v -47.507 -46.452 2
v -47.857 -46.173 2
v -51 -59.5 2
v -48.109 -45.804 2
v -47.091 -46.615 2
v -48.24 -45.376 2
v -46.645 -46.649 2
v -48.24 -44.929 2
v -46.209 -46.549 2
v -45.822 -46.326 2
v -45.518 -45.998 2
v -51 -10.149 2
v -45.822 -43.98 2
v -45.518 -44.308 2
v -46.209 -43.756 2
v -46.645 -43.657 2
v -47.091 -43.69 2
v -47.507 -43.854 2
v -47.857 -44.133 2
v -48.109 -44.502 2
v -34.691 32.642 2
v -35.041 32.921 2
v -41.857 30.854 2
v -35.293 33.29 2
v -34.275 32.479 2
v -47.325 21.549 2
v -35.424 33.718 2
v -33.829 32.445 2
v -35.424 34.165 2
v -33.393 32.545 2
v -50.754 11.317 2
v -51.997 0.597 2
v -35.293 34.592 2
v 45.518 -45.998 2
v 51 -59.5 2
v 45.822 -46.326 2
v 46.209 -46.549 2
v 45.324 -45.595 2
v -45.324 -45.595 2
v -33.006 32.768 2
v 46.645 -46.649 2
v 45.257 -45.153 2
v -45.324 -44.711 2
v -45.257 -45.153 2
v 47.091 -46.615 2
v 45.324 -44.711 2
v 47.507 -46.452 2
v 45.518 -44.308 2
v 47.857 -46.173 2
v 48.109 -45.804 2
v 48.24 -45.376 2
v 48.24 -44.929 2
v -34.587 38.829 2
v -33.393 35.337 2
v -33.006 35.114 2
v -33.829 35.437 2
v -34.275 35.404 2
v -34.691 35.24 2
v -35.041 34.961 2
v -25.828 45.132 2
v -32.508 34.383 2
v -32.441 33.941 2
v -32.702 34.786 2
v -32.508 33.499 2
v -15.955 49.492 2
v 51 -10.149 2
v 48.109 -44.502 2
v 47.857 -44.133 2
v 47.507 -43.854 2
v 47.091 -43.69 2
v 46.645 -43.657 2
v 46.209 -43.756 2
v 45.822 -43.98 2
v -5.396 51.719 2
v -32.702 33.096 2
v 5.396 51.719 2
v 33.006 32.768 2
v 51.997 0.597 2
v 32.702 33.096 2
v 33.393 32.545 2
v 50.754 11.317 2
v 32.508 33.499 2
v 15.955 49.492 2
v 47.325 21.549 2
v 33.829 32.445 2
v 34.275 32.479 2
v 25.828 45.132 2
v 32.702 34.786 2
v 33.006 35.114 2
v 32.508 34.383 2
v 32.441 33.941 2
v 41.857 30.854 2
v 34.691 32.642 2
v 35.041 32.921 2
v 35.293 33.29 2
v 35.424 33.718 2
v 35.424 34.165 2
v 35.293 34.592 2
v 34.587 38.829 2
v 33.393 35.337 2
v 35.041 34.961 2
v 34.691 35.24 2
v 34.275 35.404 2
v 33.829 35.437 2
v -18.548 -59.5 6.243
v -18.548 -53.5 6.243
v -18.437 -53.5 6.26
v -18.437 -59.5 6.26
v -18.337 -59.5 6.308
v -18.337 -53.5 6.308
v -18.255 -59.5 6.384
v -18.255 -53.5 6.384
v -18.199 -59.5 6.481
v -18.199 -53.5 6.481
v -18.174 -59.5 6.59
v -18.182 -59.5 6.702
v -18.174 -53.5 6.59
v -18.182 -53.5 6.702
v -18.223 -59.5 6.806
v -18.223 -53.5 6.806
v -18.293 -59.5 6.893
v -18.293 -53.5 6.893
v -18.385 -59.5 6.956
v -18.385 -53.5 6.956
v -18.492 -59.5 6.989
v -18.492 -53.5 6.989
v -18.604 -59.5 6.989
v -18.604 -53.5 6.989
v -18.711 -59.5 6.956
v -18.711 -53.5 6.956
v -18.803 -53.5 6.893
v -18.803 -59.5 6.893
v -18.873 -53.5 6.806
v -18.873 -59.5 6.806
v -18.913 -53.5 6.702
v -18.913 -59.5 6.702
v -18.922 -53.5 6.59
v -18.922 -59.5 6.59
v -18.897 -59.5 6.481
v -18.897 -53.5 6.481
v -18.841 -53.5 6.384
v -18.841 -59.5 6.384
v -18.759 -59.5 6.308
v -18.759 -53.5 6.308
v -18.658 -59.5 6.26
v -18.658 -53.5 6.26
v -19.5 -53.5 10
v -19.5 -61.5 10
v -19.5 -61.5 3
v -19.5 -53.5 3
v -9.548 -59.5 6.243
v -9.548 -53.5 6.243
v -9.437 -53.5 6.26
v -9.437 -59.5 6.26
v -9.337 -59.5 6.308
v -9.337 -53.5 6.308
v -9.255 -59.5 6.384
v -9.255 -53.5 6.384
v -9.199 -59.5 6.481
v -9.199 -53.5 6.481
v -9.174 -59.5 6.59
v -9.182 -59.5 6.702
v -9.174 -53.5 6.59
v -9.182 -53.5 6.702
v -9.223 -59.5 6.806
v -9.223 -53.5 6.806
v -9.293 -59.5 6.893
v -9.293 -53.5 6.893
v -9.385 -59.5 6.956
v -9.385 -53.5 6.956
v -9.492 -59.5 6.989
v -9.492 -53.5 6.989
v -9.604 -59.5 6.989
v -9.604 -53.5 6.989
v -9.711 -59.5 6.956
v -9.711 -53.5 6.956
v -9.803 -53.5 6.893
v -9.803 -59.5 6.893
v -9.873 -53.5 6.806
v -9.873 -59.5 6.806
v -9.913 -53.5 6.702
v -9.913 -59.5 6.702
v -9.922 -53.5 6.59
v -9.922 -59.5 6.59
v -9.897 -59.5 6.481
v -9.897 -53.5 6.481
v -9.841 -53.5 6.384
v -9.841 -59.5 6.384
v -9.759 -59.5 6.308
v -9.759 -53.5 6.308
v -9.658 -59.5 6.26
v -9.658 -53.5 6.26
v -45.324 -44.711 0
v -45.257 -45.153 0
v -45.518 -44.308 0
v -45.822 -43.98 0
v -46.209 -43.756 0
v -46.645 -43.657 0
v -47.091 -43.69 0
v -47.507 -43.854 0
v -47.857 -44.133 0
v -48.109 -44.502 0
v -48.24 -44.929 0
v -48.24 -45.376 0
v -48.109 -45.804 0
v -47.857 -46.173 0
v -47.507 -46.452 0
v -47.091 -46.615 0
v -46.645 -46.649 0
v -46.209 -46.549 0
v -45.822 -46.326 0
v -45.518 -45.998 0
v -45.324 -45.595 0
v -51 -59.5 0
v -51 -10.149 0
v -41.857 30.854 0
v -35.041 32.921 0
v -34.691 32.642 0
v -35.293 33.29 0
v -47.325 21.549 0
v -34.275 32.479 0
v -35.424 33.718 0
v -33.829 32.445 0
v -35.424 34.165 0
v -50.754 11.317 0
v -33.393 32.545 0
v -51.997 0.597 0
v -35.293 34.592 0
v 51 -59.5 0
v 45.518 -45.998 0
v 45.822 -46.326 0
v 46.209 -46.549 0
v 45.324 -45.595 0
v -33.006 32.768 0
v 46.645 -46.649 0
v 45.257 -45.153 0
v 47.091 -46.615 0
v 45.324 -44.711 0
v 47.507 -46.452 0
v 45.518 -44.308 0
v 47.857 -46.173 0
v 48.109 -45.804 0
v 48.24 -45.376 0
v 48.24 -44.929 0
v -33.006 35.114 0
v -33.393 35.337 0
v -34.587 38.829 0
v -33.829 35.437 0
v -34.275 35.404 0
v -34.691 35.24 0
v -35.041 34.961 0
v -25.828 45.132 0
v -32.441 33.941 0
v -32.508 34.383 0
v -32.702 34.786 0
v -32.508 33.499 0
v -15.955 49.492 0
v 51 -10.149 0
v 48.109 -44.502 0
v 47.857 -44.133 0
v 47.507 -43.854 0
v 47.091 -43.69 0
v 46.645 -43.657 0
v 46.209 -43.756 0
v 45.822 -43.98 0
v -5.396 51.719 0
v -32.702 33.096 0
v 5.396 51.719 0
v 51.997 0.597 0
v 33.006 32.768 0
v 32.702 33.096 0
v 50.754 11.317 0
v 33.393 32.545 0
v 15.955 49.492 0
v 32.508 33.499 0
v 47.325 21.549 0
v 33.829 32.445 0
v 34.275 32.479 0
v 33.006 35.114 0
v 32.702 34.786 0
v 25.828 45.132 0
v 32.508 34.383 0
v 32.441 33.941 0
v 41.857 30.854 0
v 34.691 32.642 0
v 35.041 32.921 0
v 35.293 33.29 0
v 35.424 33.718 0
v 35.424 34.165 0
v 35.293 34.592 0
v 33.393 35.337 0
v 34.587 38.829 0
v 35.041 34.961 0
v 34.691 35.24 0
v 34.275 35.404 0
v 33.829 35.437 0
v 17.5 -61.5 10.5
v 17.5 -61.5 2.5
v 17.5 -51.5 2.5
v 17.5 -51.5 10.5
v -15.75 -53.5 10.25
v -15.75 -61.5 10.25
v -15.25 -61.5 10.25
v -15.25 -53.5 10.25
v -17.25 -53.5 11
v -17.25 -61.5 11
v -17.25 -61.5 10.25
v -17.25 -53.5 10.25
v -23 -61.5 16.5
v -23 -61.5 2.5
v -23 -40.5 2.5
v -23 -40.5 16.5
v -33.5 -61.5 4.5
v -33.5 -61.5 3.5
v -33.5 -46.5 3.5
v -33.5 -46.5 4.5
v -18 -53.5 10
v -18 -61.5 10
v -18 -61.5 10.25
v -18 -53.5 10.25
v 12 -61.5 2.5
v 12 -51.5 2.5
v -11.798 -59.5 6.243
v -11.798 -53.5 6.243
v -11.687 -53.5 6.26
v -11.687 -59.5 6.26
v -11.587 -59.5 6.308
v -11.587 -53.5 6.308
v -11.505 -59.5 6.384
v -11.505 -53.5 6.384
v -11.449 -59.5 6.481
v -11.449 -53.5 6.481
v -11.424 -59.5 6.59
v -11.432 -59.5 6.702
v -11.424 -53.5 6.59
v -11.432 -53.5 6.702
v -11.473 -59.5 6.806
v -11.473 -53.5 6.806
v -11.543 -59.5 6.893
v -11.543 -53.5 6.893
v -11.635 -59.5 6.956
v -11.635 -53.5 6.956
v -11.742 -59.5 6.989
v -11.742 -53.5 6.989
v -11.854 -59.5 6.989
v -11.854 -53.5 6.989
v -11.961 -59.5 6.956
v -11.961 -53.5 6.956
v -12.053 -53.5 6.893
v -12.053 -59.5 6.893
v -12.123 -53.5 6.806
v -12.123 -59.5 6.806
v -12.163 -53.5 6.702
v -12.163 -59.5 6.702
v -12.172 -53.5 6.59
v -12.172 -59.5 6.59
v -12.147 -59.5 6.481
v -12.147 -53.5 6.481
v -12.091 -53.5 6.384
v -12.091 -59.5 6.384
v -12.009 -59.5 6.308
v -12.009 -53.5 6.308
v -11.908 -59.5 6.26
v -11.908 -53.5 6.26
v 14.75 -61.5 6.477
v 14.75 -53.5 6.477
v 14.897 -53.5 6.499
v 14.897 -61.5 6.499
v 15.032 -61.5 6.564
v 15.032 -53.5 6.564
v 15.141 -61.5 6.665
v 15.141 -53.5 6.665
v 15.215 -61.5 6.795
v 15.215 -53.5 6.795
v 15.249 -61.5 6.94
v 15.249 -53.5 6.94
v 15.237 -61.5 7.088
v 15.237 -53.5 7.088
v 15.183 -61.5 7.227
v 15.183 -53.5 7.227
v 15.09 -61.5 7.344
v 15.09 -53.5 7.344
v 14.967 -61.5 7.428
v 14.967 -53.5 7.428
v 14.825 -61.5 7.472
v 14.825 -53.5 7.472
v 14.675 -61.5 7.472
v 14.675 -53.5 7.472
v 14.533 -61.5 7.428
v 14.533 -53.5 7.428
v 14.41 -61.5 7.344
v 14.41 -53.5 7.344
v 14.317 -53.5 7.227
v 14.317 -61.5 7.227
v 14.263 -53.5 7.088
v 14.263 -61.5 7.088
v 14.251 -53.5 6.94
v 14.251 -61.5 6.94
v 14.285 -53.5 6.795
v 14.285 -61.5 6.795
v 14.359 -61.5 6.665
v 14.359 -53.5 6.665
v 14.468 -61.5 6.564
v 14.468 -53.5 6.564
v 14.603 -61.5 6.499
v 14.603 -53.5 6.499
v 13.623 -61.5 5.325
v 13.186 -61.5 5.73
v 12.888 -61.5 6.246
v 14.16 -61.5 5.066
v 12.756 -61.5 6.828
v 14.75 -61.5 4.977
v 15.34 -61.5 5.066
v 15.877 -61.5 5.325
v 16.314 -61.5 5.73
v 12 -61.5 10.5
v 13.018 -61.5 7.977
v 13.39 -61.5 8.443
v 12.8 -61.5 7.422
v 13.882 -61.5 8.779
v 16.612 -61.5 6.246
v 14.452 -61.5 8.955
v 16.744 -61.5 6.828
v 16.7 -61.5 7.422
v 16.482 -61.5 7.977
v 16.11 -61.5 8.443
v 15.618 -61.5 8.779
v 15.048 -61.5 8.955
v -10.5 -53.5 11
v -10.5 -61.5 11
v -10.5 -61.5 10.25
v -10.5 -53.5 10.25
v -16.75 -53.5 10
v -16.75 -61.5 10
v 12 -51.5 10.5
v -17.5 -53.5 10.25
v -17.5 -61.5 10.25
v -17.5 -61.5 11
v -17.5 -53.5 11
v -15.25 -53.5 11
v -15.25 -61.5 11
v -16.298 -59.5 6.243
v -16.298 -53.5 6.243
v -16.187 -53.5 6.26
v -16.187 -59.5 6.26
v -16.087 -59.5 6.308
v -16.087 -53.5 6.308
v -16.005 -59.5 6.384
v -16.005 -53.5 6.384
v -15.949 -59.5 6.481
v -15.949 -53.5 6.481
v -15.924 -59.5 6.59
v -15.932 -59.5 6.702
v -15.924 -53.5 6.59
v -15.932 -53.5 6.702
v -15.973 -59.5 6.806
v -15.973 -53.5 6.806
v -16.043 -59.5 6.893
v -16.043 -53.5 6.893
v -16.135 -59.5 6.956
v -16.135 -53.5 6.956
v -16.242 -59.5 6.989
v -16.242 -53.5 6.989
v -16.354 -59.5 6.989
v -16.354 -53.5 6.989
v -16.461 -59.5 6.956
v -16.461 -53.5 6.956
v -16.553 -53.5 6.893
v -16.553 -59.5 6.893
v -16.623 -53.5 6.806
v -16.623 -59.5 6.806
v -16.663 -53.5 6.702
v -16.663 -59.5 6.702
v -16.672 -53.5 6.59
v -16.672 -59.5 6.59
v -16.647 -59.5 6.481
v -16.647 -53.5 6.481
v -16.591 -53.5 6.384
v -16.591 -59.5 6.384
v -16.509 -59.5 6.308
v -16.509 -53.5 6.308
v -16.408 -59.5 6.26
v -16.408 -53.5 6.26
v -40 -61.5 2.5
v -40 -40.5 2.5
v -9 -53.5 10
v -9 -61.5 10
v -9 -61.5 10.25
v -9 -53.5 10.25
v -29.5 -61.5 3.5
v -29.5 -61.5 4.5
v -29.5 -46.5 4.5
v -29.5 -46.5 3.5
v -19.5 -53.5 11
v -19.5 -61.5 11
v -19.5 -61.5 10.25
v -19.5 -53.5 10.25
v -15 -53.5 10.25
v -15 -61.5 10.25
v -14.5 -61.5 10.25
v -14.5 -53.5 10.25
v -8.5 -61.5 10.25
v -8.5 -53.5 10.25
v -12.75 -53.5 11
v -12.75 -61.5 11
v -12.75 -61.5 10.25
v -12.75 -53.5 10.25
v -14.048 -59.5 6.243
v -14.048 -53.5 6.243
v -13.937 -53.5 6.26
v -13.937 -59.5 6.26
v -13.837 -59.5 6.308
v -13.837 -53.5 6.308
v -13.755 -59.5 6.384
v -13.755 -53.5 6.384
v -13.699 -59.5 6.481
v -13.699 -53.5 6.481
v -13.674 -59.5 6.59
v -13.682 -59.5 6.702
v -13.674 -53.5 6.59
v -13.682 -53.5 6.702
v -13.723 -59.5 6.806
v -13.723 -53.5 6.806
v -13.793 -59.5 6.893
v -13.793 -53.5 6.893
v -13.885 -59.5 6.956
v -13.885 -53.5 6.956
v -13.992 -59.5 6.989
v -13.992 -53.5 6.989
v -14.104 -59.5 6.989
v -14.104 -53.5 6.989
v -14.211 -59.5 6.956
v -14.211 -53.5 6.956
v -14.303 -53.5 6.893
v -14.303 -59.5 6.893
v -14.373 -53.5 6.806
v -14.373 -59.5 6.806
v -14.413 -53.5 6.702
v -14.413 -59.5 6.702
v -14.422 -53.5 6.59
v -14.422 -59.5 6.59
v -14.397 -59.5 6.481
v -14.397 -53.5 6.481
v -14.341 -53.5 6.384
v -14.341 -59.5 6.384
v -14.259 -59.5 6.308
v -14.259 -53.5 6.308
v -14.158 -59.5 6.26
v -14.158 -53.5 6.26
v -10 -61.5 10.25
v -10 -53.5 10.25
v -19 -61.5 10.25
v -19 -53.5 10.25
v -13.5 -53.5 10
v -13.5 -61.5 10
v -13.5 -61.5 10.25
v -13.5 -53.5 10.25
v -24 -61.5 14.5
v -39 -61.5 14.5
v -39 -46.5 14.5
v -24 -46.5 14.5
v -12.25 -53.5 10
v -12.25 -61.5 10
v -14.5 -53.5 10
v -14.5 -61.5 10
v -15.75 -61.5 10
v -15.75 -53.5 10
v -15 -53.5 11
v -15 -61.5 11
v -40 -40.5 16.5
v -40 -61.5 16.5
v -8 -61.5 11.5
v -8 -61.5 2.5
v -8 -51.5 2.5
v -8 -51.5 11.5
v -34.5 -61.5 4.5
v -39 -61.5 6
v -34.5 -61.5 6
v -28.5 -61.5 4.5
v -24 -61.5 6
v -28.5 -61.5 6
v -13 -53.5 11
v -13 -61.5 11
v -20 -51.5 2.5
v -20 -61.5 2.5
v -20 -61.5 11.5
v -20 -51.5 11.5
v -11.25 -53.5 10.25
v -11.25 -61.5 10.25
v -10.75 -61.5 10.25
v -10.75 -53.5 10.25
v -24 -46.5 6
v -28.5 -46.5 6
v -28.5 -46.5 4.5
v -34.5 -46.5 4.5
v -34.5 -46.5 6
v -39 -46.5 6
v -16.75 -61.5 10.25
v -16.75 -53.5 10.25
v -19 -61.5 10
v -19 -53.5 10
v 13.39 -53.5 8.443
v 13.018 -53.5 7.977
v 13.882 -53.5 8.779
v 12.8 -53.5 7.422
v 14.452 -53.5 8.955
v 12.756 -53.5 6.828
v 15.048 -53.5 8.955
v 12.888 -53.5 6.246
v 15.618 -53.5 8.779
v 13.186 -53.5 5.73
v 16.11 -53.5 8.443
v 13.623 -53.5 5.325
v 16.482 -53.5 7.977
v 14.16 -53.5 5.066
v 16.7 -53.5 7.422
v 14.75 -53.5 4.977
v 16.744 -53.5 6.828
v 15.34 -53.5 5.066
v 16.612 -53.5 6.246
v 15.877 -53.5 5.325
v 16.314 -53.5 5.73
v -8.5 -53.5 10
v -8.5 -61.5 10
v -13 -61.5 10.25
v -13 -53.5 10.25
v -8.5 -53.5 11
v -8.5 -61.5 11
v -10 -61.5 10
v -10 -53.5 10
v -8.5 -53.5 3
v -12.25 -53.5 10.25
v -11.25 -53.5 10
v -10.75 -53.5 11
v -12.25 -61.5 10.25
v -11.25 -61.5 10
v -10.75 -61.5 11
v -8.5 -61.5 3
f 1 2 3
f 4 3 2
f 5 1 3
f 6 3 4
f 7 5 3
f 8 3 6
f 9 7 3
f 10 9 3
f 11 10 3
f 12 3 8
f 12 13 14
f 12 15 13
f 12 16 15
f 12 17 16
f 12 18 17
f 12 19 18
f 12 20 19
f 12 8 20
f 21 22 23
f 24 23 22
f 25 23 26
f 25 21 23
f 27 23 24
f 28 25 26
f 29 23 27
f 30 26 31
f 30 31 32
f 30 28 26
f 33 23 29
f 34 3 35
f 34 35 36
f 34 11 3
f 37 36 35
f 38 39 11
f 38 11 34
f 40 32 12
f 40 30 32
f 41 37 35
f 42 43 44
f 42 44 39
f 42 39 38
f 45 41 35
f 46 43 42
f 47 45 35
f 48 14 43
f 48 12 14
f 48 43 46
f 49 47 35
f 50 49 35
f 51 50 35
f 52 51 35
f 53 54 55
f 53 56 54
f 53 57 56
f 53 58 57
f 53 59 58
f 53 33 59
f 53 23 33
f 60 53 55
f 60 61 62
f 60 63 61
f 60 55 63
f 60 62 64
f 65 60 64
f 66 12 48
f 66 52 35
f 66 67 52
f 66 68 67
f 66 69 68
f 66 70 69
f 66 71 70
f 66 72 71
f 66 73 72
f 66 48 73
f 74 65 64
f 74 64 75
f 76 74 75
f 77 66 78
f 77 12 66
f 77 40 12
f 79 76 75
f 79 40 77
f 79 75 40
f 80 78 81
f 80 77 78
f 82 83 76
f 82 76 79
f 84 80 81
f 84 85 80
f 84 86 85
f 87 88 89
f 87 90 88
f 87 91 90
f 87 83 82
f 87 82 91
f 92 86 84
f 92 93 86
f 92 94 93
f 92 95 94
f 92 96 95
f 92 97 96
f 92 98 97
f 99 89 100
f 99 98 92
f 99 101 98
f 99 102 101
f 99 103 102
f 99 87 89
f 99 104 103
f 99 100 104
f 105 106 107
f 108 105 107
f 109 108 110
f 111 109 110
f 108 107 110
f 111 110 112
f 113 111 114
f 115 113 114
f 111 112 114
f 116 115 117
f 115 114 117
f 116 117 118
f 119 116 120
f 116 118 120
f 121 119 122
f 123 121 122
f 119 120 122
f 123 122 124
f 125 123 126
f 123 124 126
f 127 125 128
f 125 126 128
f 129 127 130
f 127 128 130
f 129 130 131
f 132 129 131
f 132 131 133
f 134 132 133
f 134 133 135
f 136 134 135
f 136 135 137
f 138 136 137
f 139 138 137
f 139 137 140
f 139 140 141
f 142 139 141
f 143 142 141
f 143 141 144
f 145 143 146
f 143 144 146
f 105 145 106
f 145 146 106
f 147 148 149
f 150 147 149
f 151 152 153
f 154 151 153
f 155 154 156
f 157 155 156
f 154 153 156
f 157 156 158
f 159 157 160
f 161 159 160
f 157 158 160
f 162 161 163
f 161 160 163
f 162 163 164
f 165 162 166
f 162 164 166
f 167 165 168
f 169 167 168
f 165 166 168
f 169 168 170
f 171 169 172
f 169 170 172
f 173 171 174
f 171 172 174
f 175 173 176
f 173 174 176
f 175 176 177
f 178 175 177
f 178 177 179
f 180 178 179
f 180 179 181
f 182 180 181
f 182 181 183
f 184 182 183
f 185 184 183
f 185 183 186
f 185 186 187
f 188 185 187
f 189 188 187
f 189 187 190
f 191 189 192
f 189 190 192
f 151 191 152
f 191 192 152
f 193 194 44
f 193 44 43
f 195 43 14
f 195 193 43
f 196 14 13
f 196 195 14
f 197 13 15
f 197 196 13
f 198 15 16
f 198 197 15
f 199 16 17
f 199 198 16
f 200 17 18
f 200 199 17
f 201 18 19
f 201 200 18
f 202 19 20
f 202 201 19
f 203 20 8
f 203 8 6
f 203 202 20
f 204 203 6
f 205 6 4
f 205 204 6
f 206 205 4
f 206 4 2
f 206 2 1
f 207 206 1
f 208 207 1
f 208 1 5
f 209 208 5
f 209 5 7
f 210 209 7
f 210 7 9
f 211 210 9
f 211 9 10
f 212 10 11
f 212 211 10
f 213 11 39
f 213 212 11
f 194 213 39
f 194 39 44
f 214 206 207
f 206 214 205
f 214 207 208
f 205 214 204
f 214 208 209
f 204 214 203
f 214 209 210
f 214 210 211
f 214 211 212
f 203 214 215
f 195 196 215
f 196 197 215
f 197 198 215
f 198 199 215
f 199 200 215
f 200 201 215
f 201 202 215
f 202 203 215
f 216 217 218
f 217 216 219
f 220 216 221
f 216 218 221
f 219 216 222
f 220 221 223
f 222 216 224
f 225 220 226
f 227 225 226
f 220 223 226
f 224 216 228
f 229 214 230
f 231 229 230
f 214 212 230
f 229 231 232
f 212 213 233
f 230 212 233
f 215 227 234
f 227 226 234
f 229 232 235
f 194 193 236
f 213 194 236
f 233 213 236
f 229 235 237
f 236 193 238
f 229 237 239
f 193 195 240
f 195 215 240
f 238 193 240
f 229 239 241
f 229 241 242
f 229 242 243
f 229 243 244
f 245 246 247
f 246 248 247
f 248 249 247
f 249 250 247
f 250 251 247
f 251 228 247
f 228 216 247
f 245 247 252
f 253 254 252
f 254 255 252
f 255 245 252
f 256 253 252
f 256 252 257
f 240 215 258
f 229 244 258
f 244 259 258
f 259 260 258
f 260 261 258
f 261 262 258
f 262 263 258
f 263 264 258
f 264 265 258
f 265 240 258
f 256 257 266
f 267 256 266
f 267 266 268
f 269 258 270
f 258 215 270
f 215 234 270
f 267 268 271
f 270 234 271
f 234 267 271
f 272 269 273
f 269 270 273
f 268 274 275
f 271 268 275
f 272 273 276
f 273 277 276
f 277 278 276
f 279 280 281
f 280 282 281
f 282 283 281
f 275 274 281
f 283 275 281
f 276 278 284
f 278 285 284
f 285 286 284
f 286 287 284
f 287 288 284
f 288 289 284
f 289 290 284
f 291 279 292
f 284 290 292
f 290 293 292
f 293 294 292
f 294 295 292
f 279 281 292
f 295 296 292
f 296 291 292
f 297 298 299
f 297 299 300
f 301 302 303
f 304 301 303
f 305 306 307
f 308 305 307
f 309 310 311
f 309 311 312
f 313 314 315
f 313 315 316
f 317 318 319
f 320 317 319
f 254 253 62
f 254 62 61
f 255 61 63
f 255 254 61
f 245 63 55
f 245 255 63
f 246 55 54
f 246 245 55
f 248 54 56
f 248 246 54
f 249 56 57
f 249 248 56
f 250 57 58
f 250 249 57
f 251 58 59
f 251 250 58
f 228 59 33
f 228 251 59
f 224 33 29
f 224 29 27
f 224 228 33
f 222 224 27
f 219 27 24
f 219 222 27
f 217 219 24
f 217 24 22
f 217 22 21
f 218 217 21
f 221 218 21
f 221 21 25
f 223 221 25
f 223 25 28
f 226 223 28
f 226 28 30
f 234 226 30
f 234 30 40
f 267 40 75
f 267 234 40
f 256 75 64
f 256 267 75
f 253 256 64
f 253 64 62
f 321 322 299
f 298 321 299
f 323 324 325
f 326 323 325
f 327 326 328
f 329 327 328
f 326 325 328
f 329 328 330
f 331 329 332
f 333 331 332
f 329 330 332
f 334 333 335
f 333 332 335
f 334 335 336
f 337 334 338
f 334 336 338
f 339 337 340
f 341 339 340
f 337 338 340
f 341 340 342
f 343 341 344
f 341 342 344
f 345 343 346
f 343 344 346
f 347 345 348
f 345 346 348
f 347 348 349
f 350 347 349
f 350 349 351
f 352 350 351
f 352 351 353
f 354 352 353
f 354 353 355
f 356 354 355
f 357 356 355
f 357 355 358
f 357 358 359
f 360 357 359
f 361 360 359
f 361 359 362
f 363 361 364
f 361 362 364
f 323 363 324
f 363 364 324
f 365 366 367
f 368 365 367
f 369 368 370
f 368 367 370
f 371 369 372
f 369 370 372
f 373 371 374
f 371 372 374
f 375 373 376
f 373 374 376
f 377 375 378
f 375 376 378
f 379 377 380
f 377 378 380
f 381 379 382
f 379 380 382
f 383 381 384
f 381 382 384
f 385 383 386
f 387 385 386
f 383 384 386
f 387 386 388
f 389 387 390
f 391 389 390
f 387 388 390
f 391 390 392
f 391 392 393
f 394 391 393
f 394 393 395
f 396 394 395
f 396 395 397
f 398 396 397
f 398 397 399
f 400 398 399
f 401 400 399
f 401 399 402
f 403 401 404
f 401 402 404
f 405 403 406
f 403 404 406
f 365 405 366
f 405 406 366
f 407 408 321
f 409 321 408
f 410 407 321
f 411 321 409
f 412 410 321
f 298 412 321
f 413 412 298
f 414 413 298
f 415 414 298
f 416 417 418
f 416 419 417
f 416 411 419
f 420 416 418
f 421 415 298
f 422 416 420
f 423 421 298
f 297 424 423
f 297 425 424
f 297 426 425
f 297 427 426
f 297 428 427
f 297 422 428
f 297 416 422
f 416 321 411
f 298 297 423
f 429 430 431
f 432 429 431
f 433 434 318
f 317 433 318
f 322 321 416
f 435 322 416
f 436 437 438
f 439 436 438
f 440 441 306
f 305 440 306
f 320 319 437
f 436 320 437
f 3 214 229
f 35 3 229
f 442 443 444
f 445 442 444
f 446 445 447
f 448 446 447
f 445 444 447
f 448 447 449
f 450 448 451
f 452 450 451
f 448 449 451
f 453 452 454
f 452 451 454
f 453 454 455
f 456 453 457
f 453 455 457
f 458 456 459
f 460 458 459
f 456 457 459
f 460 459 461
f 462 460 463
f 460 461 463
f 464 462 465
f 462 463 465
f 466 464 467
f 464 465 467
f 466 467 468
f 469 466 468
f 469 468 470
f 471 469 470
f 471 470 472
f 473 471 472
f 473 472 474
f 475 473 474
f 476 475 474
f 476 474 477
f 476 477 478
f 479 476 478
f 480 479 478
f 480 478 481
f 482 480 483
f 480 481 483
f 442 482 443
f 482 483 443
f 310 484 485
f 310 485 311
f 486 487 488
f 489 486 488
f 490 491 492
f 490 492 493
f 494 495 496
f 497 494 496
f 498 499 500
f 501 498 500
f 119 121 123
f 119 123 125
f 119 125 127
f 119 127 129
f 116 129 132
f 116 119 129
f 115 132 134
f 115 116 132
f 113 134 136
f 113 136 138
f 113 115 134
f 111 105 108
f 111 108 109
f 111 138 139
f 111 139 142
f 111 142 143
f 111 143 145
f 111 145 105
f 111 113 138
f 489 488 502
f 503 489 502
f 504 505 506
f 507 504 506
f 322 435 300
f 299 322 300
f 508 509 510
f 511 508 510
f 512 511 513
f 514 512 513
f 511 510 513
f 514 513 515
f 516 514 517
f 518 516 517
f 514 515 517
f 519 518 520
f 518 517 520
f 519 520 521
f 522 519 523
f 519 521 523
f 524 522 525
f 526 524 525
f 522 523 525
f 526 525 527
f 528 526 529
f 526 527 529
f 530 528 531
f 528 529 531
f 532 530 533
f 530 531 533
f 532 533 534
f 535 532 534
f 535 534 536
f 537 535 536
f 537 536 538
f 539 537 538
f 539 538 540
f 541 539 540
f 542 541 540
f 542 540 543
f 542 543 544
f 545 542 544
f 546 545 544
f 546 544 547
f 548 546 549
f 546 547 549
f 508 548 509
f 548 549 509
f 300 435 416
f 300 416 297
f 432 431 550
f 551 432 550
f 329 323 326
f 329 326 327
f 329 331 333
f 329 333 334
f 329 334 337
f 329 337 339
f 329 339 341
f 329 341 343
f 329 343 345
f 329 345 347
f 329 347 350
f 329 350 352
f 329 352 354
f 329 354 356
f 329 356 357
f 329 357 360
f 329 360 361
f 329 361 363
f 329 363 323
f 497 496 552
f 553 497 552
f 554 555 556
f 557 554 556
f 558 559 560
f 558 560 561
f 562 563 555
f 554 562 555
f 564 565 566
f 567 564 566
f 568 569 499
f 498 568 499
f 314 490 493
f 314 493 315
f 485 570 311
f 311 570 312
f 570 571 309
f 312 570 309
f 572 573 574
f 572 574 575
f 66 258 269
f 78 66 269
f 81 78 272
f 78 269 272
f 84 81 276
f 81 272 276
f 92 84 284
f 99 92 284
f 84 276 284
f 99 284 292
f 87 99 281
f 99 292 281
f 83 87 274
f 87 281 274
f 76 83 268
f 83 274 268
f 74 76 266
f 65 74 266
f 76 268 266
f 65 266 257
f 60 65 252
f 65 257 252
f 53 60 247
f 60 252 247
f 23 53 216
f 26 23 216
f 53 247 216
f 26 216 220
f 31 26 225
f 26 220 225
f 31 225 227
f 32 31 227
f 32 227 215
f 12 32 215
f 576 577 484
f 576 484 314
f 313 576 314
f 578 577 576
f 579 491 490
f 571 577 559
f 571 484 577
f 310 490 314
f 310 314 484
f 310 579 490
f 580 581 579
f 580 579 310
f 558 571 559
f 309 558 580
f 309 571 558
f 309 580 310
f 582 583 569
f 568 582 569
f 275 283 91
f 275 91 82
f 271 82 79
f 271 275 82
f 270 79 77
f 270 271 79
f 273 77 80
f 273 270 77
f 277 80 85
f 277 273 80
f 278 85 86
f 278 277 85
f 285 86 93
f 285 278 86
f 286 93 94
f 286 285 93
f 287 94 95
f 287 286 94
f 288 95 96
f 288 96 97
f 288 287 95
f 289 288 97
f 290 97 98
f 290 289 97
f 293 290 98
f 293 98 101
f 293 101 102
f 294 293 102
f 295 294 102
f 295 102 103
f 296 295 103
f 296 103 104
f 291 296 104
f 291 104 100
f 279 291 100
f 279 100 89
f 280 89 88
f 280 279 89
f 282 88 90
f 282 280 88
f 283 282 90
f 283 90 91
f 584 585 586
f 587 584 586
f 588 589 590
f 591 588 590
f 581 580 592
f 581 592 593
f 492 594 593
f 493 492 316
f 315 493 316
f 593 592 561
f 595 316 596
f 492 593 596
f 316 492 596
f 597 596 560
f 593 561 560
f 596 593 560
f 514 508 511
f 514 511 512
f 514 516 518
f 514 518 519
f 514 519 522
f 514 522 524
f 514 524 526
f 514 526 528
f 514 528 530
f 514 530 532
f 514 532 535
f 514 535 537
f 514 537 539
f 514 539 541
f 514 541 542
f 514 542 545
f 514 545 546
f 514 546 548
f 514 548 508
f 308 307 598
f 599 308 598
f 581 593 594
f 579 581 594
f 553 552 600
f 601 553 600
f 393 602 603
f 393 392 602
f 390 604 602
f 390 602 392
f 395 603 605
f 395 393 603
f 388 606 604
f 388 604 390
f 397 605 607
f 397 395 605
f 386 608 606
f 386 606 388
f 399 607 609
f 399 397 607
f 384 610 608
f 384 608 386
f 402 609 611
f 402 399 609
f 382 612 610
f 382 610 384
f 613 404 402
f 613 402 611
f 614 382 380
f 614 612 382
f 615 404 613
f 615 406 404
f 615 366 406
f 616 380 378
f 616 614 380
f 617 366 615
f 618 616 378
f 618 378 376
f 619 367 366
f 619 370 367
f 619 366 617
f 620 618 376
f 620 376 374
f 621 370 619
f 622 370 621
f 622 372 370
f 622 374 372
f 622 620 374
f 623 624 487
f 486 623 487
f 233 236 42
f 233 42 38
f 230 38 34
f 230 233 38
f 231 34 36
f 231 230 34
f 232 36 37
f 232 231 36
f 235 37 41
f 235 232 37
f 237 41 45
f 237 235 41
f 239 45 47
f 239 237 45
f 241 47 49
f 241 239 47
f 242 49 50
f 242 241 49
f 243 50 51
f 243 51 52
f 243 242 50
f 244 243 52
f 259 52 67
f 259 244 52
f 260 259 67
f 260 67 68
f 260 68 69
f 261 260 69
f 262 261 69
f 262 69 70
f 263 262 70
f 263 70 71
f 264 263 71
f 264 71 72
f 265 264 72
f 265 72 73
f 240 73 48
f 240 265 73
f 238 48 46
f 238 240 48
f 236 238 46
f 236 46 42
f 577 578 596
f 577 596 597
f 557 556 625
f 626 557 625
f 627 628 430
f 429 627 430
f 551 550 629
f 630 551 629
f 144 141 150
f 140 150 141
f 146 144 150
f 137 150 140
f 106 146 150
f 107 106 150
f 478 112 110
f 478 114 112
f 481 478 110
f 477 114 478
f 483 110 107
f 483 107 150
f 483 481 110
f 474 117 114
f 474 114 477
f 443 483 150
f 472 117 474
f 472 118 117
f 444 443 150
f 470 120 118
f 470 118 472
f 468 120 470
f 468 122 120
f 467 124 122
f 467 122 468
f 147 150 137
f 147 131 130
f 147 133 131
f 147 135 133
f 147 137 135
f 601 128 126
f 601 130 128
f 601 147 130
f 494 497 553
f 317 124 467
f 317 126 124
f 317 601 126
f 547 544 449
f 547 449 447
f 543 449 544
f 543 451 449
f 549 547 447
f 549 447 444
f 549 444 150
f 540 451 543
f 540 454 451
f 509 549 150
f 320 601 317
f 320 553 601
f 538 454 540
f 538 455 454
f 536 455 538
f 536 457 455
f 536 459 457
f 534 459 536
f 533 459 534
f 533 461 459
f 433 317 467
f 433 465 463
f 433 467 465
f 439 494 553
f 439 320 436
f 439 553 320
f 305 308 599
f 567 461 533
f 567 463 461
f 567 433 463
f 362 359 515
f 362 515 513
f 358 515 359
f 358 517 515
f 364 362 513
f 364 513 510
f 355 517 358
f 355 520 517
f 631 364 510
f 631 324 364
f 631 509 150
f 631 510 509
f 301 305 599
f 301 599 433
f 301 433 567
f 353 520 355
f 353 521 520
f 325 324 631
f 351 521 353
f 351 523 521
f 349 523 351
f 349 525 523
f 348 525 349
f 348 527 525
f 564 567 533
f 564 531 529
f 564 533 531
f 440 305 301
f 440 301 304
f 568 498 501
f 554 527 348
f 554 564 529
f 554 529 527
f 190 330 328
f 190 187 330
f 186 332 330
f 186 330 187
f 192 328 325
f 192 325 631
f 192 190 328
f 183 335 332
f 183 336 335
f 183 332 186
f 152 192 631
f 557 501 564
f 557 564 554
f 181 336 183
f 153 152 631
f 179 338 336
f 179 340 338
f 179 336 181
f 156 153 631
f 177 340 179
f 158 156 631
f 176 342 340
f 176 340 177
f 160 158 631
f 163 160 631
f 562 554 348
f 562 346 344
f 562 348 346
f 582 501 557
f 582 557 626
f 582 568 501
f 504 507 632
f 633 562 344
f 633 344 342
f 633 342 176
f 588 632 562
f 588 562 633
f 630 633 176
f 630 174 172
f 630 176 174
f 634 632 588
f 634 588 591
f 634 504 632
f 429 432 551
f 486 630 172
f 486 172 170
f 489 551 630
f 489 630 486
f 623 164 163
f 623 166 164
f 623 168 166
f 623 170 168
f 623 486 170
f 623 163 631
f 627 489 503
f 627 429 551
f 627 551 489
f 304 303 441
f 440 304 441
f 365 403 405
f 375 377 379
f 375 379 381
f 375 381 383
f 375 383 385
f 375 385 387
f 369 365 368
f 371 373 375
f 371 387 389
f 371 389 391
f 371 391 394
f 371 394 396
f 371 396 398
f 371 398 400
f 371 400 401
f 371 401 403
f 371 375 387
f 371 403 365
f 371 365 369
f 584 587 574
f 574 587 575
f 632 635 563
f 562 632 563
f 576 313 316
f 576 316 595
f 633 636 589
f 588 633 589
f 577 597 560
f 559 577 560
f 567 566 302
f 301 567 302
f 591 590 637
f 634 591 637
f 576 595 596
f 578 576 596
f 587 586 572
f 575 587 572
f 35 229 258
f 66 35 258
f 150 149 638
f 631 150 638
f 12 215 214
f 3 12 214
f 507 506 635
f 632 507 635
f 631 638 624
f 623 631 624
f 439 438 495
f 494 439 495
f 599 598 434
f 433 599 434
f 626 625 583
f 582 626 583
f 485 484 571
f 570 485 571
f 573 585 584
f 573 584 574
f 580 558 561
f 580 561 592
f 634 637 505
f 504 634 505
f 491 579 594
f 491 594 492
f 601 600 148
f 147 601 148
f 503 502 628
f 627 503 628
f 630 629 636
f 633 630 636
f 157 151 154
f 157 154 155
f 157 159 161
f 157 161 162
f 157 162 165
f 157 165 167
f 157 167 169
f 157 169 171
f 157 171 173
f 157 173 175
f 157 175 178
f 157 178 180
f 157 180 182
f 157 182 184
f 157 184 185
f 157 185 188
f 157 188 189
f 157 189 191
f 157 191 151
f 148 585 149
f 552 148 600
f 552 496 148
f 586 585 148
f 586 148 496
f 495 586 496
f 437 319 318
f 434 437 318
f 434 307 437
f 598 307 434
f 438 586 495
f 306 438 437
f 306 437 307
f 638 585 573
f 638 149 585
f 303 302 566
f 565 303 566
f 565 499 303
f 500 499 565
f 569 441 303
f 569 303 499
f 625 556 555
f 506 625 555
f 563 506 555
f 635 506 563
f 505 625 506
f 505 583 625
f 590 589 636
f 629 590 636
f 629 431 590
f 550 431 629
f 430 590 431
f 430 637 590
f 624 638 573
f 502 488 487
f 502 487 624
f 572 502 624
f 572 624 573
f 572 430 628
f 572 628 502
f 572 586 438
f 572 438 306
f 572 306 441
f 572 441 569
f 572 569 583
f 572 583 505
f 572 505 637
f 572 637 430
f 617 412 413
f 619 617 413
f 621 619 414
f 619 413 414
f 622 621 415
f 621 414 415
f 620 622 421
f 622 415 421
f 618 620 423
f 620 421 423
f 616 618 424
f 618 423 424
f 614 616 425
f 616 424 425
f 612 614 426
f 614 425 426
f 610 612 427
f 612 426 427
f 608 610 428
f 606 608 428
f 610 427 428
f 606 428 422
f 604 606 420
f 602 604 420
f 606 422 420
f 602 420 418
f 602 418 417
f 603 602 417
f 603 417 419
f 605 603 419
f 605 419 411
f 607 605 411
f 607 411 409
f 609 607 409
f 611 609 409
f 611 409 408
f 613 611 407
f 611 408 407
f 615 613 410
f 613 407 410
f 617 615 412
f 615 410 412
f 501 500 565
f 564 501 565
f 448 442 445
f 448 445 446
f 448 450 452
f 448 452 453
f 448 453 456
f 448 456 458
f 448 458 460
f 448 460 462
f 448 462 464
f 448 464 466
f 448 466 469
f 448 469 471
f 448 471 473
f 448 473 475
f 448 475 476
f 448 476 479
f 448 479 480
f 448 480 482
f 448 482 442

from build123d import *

# Parameters (mm, degrees)
ESQUISSE1_R             = 1.5
BOSS_EXTRU_1_DEPTH      = 2
ESQUISSE2_W             = 17
ESQUISSE2_H             = 14
BOSS_EXTRU_2_DEPTH      = 21
ENL_V_MAT_EXTRU_1_DEPTH = 15
ESQUISSE4_W             = 12
ESQUISSE4_H             = 9
BOSS_EXTRU_3_DEPTH      = 10
ENL_V_MAT_EXTRU_2_DEPTH = 8
ESQUISSE6_R             = 0.375
BOSS_EXTRU_4_DEPTH      = 6
ESQUISSE7_W             = 5.5
ESQUISSE7_H             = 8
BOSS_EXTRU_5_DEPTH      = 10
ESQUISSE8_R             = 2
ENL_V_MAT_EXTRU_3_DEPTH = 8
ESQUISSE9_R             = 0.5
BOSS_EXTRU_6_DEPTH      = 8


with BuildPart() as part:
    # Esquisse1 → Boss.-Extru.1 (new body)
    with BuildSketch(Plane.XY):
        with BuildLine():
            Line((-51, -59.5), (51, -59.5))
            Line((51, -59.5), (51, -10.148891565))
            ThreePointArc((51, -10.148891565), (0, 52), (-51, -10.148891565))
            Line((-51, -10.148891565), (-51, -59.5))
        make_face()
        with Locations((-33.941125497, 33.941125497)):
            Circle(ESQUISSE1_R, mode=Mode.SUBTRACT)
        with Locations((-46.757087022, -45.15279408)):
            Circle(ESQUISSE1_R, mode=Mode.SUBTRACT)
        with Locations(Location((33.941125497, 33.941125497, 0), (0, 0, 180))):
            Circle(ESQUISSE1_R, mode=Mode.SUBTRACT)
        with Locations(Location((46.757087022, -45.15279408, 0), (0, 0, 180))):
            Circle(ESQUISSE1_R, mode=Mode.SUBTRACT)
    extrude(amount=BOSS_EXTRU_1_DEPTH)


with BuildPart() as body_2:
    # Esquisse2 → Boss.-Extru.2 (new body)
    with BuildSketch(Plane.XZ.offset(61.5)):
        with Locations((-31.5, 9.5)):
            Rectangle(ESQUISSE2_W, ESQUISSE2_H)
    extrude(amount=-BOSS_EXTRU_2_DEPTH)

    # Esquisse3 → Enlèv. mat.-Extru.1 (cut)
    with BuildSketch(Plane.XZ.offset(61.5)):
        Polygon((-39, 14.5), (-24, 14.5), (-24, 6), (-28.5, 6), (-28.5, 4.5), (-29.5, 4.5), (-29.5, 3.5), (-33.5, 3.5), (-33.5, 4.5), (-34.5, 4.5), (-34.5, 6), (-39, 6), align=None)
    extrude(amount=-ENL_V_MAT_EXTRU_1_DEPTH, mode=Mode.SUBTRACT)


with BuildPart() as body_3:
    # Esquisse4 → Boss.-Extru.3 (new body)
    with BuildSketch(Plane.XZ.offset(61.5)):
        with Locations((-14, 7)):
            Rectangle(ESQUISSE4_W, ESQUISSE4_H)
    extrude(amount=-BOSS_EXTRU_3_DEPTH)

    # Esquisse5 → Enlèv. mat.-Extru.2 (cut)
    with BuildSketch(Plane.XZ.offset(61.5)):
        Polygon((-19.5, 3), (-8.5, 3), (-8.5, 10), (-9, 10), (-9, 10.25), (-8.5, 10.25), (-8.5, 11), (-10.5, 11), (-10.5, 10.25), (-10, 10.25), (-10, 10), (-10.75, 10), (-11.25, 10), (-11.25, 10.25), (-10.75, 10.25), (-10.75, 11), (-12.75, 11), (-12.75, 10.25), (-12.25, 10.25), (-12.25, 10), (-13, 10), (-13.5, 10), (-13.5, 10.25), (-13, 10.25), (-13, 11), (-15, 11), (-15, 10.25), (-14.5, 10.25), (-14.5, 10), (-15.25, 10), (-15.75, 10), (-15.75, 10.25), (-15.25, 10.25), (-15.25, 11), (-17.25, 11), (-17.25, 10.25), (-16.75, 10.25), (-16.75, 10), (-17.5, 10), (-18, 10), (-18, 10.25), (-17.5, 10.25), (-17.5, 11), (-19.5, 11), (-19.5, 10.25), (-19, 10.25), (-19, 10), (-19.5, 10), align=None)
    extrude(amount=-ENL_V_MAT_EXTRU_2_DEPTH, mode=Mode.SUBTRACT)

    # Esquisse6 → Boss.-Extru.4 (add)
    with BuildSketch(Plane.XZ.offset(53.5)):
        with Locations(Location((-18.54781029, 6.618225755, 0), (0, 0, 270))):
            Circle(ESQUISSE6_R)
        with Locations(Location((-16.29781029, 6.618225755, 0), (0, 0, 270))):
            Circle(ESQUISSE6_R)
        with Locations(Location((-14.04781029, 6.618225755, 0), (0, 0, 270))):
            Circle(ESQUISSE6_R)
        with Locations(Location((-11.79781029, 6.618225755, 0), (0, 0, 270))):
            Circle(ESQUISSE6_R)
        with Locations(Location((-9.54781029, 6.618225755, 0), (0, 0, 270))):
            Circle(ESQUISSE6_R)
    extrude(amount=BOSS_EXTRU_4_DEPTH)


with BuildPart() as body_4:
    # Esquisse7 → Boss.-Extru.5 (new body)
    with BuildSketch(Plane.XZ.offset(61.5)):
        with Locations((14.75, 6.5)):
            Rectangle(ESQUISSE7_W, ESQUISSE7_H)
    extrude(amount=-BOSS_EXTRU_5_DEPTH)

    # Esquisse8 → Enlèv. mat.-Extru.3 (cut)
    with BuildSketch(Plane.XZ.offset(61.5)):
        with Locations(Location((14.75, 6.977178827, 0), (0, 0, 270))):
            Circle(ESQUISSE8_R)
    extrude(amount=-ENL_V_MAT_EXTRU_3_DEPTH, mode=Mode.SUBTRACT)

    # Esquisse9 → Boss.-Extru.6 (add)
    with BuildSketch(Plane.XZ.offset(53.5)):
        with Locations(Location((14.75, 6.977178827, 0), (0, 0, 270))):
            Circle(ESQUISSE9_R)
    extrude(amount=BOSS_EXTRU_6_DEPTH)


solid = Compound([part.part, body_2.part, body_3.part, body_4.part])
